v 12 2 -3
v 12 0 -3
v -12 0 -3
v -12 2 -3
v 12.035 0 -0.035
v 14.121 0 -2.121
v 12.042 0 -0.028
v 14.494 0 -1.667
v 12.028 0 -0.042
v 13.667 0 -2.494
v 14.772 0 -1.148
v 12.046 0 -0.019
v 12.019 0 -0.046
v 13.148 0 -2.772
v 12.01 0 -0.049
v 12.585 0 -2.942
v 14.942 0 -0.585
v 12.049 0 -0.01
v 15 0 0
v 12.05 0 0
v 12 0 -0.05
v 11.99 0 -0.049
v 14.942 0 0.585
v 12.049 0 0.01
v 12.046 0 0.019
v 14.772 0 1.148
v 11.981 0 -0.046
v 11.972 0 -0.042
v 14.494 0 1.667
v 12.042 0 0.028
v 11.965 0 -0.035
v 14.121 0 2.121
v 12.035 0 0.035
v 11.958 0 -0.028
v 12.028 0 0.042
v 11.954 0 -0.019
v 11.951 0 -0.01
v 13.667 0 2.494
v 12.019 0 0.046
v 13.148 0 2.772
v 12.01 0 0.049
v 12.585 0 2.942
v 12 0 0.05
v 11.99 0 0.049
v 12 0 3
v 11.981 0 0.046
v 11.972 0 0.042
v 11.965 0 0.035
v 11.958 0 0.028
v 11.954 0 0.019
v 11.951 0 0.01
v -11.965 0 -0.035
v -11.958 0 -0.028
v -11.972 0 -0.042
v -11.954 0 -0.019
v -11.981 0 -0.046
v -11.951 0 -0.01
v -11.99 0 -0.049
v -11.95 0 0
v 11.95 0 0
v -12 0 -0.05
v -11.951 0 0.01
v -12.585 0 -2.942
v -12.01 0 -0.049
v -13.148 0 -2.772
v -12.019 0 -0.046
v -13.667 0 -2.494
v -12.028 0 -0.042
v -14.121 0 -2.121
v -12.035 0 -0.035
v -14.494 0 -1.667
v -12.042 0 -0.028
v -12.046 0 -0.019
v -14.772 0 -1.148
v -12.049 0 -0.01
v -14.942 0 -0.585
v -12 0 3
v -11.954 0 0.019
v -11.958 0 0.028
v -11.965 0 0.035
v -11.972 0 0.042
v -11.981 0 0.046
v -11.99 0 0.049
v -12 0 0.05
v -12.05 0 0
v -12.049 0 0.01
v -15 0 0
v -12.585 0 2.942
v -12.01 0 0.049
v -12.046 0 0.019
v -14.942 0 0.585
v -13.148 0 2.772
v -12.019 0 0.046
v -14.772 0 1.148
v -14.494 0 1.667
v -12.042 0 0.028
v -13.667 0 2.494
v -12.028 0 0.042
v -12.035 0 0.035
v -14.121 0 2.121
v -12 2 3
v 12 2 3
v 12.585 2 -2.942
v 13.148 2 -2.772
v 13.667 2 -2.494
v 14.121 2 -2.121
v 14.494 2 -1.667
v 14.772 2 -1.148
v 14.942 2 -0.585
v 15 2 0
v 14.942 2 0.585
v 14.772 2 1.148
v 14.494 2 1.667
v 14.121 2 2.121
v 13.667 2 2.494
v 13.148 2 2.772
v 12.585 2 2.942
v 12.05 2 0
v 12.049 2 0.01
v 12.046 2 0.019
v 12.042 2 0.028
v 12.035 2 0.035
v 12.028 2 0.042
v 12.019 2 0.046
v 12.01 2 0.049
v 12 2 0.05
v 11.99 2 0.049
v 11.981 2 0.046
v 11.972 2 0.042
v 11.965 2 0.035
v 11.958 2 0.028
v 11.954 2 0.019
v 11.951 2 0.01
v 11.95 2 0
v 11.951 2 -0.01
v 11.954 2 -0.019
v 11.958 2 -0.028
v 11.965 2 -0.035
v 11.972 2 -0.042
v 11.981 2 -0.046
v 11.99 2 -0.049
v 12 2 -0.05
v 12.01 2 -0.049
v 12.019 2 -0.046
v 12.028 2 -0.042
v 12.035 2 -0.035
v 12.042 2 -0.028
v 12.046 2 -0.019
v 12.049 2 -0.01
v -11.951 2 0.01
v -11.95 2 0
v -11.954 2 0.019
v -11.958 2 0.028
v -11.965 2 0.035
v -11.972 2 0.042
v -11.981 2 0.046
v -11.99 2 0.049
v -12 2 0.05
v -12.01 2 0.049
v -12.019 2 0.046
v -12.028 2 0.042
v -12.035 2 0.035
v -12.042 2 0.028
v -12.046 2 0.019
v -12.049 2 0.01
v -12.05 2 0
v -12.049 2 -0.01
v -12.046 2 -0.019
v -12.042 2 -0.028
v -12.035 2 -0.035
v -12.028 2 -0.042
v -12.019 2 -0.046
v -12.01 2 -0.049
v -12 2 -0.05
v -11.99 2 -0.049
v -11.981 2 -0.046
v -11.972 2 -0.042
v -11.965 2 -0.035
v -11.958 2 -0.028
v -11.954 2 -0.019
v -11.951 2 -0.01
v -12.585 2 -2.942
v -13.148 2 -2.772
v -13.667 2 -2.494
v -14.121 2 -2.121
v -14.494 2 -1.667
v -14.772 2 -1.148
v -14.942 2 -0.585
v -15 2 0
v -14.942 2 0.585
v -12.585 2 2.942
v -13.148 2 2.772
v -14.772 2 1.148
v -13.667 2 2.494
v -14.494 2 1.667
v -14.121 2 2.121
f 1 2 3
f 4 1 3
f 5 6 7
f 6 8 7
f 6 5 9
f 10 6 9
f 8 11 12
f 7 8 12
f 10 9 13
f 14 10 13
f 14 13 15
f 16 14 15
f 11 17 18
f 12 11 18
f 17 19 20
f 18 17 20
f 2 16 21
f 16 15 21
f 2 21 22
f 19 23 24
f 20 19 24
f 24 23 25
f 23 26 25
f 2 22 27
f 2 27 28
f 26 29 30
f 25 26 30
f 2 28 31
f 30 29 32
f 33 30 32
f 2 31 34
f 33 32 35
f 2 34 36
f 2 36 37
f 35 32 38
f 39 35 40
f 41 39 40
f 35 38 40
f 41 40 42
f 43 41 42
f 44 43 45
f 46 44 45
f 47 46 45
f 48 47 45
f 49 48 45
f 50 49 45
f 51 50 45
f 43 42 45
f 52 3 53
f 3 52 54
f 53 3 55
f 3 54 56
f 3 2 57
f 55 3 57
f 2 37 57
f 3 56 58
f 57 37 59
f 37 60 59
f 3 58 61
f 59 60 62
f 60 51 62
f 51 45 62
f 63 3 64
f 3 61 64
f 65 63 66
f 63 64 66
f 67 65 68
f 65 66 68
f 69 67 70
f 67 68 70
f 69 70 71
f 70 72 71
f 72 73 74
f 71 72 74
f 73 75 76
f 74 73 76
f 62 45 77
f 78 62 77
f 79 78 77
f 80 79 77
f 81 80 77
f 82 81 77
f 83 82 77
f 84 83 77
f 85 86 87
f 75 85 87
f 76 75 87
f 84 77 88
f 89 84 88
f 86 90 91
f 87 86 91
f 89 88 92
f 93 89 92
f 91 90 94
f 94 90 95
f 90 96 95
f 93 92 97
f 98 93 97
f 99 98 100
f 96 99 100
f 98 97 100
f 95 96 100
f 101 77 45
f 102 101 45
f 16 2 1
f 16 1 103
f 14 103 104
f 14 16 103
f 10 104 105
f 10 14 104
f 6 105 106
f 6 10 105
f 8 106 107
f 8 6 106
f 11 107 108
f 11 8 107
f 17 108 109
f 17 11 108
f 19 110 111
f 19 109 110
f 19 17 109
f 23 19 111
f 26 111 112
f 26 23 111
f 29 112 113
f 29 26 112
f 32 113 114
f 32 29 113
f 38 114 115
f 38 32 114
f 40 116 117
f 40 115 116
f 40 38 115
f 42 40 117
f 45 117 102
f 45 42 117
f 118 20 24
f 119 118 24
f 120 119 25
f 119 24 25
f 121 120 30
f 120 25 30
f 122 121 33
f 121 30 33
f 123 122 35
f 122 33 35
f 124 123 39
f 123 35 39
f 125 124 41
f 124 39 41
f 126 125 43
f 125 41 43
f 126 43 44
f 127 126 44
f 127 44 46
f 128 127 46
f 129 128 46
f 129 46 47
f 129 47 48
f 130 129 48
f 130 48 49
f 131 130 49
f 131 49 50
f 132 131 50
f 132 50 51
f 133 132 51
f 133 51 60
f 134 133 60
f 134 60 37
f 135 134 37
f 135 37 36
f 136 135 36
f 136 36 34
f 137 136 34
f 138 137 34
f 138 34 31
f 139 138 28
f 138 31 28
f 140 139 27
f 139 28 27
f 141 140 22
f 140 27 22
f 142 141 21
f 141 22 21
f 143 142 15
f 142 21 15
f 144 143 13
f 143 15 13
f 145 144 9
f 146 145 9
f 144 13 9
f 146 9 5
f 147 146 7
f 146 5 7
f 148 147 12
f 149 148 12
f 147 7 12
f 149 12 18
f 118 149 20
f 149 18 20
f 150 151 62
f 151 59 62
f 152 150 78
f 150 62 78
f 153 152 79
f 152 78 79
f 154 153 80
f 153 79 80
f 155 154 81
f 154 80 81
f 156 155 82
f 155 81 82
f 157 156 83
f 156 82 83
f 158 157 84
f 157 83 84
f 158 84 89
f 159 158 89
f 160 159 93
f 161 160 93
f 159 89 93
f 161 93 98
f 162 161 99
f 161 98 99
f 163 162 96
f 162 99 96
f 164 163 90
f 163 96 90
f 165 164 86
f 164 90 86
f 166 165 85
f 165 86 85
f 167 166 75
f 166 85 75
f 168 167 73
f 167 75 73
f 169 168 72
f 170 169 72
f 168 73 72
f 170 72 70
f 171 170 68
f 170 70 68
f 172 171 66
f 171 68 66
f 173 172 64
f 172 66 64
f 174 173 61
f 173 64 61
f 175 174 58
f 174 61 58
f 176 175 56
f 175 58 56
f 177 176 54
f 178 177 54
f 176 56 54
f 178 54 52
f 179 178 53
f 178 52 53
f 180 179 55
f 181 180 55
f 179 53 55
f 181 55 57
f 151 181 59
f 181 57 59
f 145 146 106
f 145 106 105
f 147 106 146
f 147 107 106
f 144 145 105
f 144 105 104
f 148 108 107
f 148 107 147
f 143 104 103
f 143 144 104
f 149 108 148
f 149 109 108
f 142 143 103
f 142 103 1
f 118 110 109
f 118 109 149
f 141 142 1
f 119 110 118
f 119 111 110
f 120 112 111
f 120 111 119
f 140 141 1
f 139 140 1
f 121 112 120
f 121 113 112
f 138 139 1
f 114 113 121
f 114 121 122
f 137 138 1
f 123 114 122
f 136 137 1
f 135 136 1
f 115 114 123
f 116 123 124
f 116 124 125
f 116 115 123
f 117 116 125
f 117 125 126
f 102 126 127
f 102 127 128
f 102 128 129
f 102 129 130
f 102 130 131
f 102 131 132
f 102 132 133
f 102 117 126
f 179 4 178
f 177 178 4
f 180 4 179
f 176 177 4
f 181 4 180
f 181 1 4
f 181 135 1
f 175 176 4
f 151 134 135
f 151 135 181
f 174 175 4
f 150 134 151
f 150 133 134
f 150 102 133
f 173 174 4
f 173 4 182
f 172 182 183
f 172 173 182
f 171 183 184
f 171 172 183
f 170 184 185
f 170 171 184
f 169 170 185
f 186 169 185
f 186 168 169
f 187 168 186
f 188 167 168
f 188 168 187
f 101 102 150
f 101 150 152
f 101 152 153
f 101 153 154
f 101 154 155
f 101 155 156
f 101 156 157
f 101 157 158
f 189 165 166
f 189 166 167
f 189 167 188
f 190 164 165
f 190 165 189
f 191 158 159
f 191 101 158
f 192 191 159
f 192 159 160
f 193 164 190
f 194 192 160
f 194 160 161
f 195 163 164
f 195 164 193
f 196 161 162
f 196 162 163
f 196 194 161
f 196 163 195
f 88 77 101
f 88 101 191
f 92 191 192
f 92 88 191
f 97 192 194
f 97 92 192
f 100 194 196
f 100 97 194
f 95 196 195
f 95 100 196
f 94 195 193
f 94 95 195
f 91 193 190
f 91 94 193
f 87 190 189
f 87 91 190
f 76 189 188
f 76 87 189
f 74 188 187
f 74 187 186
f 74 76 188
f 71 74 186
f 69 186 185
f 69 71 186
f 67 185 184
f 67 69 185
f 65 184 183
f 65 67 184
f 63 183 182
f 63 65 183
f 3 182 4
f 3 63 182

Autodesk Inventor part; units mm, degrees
ref_plane "YZ Plane" through (0, 0, 0) normal (1, 0, 0) x (0, 1, 0)
ref_plane "XZ Plane" through (0, 0, 0) normal (0, 1, 0) x (-1, 0, 0)
ref_plane "XY Plane" through (0, 0, 0) normal (0, 0, 1) x (1, 0, 0)
sketch "Sketch1" plane through (0, 0, 0) normal (0, 1, 0) x (-1, 0, 0)
  line L0 (-12, -3) -> (12, -3)
  line L1 (12, -3) -> (12, 3)
  line L2 (12, 3) -> (-12, 3)
  line L3 (-12, 3) -> (-12, -3)
  line L4 (-12, -3) -> (12, 3) construction
  line L5 (12, -3) -> (-12, 3) construction
  circle A0 centre (12, 0) radius 3
  circle A1 centre (-12, 0) radius 3
  point P0 (0, 0)
  dimension "d0" = 24
  dimension "d1" = 6
  dimension "d2" = 6
  dimension "d3" = 6
extrude "Extrusion1" add sketch "Sketch1" along normal blind 2
sketch "Sketch2" plane through (0, 2, 0) normal (0, 1, 0) x (1, 0, 0)
  arc A0 (12, -3) -> (12, 3) centre (12, 0) ccw projected
  arc A1 (-12, 3) -> (-12, -3) centre (-12, 0) ccw projected
  circle A2 centre (-12, 0) radius 1
  circle A3 centre (12, 0) radius 1.5
  circle A4 centre (-12, 0) radius 1.5
  point P0 (0, 0)
  dimension "d6" = 2
  dimension "d7" = 3
  dimension "d8" = 3
extrude "Extrusion2" cut sketch "Sketch2" against normal blind 2 contours A2 | A3 | A4
sketch "Sketch3" plane through (0, 0, 0) normal (0, -1, 0) x (1, 0, 0)
  circle A0 centre (12, 0) radius 1.5 projected
  circle A1 centre (-12, 0) radius 1.5 projected
  arc A2 (12, -3) -> (12, 3) centre (12, 0) ccw projected
  arc A3 (-12, 3) -> (-12, -3) centre (-12, 0) ccw projected
  circle A4 centre (-12, 0) radius 0.005
  circle A5 centre (12, 0) radius 0.005
  point P0 (0, 0)
  dimension "d11" = 0.01
  dimension "d12" = 0.01
extrude "Extrusion3" add sketch "Sketch3" against normal blind 2
sketch "Sketch4" plane through (0, 0, 0) normal (0, -1, 0) x (1, 0, 0)
  arc A0 (12, -3) -> (12, 3) centre (12, 0) ccw projected
  arc A1 (-12, 3) -> (-12, -3) centre (-12, 0) ccw projected
  circle A2 centre (-12, 0) radius 0.05
  circle A3 centre (12, 0) radius 0.05
  point P0 (0, 0)
  dimension "d15" = 0.1
  dimension "d16" = 0.1
extrude "Extrusion4" cut sketch "Sketch4" against normal blind 2
properties part number "tahlo5_sablona"
